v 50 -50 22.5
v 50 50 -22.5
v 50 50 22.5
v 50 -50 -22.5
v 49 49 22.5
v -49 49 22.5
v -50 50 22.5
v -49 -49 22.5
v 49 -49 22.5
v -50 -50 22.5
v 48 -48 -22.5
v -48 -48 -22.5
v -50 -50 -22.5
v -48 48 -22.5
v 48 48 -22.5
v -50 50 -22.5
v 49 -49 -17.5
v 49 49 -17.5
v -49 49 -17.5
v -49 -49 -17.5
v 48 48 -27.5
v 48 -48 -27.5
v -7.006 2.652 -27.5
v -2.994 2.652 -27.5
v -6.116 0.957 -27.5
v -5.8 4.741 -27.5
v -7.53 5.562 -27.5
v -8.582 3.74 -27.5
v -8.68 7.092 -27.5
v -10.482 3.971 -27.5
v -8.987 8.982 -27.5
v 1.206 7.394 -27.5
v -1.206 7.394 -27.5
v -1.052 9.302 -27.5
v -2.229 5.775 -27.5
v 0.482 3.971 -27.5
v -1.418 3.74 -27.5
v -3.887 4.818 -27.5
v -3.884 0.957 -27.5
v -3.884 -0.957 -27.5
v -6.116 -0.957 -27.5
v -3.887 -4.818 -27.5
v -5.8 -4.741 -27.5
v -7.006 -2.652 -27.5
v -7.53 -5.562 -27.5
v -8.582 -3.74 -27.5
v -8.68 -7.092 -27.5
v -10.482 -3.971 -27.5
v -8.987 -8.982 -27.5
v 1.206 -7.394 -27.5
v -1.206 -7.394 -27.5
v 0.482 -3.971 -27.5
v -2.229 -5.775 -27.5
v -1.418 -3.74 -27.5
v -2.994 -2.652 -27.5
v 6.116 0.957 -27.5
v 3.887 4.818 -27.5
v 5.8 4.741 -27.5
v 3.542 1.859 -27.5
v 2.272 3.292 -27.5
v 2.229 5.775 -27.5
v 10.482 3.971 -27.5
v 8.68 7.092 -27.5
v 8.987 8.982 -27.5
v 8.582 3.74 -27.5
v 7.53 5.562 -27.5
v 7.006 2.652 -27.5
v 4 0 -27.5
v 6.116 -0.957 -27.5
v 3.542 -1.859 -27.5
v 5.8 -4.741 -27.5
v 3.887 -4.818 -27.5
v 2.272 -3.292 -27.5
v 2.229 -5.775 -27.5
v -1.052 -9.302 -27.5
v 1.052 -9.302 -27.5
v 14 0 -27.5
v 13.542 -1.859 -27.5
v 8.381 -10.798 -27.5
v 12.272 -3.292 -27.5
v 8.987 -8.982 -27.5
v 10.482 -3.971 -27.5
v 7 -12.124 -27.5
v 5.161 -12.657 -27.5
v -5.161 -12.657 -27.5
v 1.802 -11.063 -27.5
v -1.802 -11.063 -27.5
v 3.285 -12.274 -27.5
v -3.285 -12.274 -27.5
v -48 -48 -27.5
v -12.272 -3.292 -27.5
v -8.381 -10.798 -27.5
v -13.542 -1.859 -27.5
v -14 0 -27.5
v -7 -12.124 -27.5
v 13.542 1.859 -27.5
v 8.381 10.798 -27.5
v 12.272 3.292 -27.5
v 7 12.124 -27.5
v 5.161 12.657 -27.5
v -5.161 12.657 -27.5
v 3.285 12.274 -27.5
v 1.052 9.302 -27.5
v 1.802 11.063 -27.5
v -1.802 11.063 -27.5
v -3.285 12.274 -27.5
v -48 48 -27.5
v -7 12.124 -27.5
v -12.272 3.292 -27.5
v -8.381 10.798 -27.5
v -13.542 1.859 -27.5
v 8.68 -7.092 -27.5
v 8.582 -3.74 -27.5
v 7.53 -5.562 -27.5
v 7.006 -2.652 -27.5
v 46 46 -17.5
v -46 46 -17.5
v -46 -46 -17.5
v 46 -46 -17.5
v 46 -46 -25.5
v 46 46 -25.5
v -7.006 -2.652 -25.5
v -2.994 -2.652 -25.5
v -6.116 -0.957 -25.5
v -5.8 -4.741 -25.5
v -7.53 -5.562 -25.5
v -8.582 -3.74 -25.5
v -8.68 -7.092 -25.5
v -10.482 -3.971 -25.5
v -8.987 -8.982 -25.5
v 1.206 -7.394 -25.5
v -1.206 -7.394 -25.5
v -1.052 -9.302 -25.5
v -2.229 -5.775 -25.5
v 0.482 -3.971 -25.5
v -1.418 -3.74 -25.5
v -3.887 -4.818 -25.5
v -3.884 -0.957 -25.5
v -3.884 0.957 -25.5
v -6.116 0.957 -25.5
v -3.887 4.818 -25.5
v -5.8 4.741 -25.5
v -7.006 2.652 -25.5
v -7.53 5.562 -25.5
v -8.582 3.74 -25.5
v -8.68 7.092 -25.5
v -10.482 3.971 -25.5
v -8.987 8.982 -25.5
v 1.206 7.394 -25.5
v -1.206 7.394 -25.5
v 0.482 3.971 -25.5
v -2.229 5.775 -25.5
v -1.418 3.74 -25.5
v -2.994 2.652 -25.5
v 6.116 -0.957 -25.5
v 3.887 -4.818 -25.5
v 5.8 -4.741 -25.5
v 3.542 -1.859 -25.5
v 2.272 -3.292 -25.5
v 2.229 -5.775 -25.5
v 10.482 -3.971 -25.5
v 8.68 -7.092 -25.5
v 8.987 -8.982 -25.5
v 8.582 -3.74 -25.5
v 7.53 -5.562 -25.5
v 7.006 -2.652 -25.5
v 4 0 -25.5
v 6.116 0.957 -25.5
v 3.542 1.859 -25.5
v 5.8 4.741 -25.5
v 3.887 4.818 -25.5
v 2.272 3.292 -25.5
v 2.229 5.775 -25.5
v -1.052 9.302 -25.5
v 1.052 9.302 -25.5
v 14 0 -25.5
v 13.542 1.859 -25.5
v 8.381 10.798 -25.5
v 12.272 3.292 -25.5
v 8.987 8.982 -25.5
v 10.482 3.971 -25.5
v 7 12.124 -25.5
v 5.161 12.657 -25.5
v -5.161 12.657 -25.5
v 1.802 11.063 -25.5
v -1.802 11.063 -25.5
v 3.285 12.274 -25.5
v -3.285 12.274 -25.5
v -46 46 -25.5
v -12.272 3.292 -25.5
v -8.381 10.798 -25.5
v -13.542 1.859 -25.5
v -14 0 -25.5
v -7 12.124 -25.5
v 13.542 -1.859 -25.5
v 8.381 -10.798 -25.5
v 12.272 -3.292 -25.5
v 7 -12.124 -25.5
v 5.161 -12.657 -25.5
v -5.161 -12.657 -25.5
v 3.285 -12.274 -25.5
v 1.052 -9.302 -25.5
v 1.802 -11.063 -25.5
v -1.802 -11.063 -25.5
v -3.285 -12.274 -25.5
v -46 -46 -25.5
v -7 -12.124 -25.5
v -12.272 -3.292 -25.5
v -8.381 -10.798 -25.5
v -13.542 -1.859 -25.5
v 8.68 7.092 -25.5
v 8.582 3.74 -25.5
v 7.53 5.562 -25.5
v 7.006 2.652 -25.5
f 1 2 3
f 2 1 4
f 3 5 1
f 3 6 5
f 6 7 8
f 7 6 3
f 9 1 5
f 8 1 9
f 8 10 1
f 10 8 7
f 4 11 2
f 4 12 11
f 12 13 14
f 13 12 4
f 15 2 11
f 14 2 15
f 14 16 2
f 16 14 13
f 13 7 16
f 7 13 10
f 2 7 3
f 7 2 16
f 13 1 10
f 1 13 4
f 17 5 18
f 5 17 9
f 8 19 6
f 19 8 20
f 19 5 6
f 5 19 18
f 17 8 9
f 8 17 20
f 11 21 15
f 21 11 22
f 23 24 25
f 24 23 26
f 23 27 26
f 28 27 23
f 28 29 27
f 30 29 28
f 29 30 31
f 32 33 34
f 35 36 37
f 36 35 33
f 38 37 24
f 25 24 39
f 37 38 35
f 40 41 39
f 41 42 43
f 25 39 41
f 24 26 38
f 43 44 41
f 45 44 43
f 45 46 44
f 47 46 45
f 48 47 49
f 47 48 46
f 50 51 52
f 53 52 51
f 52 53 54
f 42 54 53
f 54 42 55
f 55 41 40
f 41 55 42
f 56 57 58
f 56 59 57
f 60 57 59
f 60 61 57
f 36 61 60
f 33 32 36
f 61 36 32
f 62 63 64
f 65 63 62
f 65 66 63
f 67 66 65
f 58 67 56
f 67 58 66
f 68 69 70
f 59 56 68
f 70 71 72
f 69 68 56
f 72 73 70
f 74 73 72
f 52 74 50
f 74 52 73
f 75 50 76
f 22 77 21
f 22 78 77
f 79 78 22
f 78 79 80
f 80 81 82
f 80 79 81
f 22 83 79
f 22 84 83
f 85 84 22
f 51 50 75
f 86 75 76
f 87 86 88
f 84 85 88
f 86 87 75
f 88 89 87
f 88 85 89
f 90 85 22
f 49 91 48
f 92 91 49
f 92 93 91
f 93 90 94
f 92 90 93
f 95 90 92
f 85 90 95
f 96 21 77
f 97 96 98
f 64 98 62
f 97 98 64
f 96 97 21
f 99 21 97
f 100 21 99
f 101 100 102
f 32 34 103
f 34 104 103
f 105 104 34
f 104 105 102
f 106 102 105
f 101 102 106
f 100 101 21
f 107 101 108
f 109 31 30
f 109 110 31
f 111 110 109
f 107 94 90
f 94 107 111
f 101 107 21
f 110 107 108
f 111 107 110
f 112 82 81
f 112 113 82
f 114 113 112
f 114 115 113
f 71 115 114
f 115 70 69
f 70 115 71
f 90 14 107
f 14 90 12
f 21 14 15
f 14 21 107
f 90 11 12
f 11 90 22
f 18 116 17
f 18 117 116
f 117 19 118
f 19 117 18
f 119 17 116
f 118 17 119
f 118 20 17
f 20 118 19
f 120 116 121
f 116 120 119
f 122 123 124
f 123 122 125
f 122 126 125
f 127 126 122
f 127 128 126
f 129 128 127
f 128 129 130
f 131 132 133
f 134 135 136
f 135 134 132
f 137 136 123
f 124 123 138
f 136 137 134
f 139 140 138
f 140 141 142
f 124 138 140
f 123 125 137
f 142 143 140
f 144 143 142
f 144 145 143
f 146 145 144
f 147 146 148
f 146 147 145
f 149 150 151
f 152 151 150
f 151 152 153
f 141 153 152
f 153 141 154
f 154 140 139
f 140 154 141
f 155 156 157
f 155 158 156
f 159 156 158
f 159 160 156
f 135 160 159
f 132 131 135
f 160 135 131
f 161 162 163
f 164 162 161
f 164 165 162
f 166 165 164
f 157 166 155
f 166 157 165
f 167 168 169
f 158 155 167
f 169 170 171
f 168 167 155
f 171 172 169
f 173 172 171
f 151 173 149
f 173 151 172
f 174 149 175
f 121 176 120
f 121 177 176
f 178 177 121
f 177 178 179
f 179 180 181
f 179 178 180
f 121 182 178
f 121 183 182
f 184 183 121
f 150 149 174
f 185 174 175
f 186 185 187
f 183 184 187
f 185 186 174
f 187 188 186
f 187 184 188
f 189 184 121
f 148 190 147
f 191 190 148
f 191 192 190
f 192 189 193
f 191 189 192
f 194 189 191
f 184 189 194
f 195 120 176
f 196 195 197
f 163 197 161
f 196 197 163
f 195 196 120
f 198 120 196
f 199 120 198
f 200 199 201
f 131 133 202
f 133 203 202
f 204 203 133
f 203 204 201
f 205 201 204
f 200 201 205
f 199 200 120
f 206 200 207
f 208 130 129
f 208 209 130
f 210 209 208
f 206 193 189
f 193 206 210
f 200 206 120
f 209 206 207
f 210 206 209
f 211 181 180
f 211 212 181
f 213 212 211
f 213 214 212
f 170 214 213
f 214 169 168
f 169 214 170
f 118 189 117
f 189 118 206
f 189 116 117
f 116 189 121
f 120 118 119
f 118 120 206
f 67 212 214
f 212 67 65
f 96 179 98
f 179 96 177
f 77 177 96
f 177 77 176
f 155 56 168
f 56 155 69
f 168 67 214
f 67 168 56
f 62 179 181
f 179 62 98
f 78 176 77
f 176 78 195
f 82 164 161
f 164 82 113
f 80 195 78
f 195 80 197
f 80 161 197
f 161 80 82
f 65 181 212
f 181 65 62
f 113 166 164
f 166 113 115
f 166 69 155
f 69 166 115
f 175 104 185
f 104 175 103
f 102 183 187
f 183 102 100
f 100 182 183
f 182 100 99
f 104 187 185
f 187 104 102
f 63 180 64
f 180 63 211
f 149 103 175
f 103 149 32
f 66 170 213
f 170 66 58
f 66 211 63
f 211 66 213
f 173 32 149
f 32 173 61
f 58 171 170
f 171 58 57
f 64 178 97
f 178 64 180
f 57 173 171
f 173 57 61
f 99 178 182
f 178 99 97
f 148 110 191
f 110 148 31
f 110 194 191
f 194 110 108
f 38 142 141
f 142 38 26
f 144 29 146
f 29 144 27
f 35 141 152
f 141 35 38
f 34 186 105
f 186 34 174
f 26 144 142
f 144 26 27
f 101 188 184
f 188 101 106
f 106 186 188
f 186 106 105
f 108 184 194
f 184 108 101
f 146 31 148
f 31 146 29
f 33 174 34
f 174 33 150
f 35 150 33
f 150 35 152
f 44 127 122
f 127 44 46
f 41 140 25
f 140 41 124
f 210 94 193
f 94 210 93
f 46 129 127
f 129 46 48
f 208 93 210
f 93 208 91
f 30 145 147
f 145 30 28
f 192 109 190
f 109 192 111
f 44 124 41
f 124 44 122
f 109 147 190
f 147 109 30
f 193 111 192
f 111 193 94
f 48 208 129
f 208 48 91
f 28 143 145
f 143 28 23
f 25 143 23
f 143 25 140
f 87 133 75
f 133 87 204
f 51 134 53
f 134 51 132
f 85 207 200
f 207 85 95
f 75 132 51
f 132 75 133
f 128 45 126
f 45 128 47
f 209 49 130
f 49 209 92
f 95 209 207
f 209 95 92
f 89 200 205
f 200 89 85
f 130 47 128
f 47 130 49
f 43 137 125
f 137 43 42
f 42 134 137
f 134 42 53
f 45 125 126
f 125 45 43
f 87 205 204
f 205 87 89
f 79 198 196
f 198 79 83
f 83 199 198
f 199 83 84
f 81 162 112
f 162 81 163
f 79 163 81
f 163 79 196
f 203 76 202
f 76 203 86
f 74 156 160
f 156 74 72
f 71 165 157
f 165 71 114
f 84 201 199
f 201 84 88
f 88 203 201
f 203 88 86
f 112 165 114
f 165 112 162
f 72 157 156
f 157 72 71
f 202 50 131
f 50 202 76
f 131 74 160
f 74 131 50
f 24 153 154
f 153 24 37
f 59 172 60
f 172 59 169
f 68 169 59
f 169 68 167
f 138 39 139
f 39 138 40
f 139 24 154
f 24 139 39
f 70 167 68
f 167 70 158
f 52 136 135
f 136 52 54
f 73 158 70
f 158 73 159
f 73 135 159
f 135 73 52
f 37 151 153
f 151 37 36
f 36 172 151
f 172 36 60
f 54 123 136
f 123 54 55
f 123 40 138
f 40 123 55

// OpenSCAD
// file: parameters.scad
$width = 100;
$depth = 100;
$height = 50;

$margin = 2;

$connection = 5;

$hole_dia = 4;
// main file
include <parameters.scad>

module planter() {
  union() {
    difference() {
      difference() {
        union() {
          // Top part of planter
          color("lime") difference() {
            cube(size = [ $width, $depth, $height - $connection ],
                 center = true);

            // DIFF
            translate([ 0, 0, $margin ]) cube(
                size =
                    [ $width - $margin, $depth - $margin, $height + $margin ],
                center = true);
          }

          // Bottom connector
          color("tomato") translate([ 0, 0, -($height / 2) ]) {
            union() {
              // Connector part
              cube(size =
                       [
                         $width - $margin * 2, $depth - $margin * 2,
                         $connection
                       ],
                   center = true);

              // Connecting bit to outer shell
              translate([ 0, 0, $connection ])
                  cube(size = [ $width - .1, $depth - .1, $connection ],
                       center = true);
            }
          }
        }
        // DIFF
        translate([ 0, 0, -$height / 2 + $margin * 2 ])
            cube(size =
                     [
                       $width - $margin * 4, $depth - $margin * 4,
                       $connection + $margin * 2
                     ],
                 center = true);
      }

      // Drainage holes
      translate([ 0, 0, -$height ]) cylinder($height, $hole_dia, $hole_dia);
      for (i = [0:5]) {
        rotate([ 0, 0, 360 / 6 * i ])
            translate([ $hole_dia * 2 + $margin, 0, -$height ])
                cylinder($height, $hole_dia, $hole_dia);
      }
    }

    // color("violet") translate([ 0, 0, -$height / 2 - $margin * 1.25 ]) {
    //   difference() {
    //     cylinder($height, $hole_dia, $hole_dia);
    //     translate([ 0, 0, -$margin ])
    //         cylinder($height + $margin * 2, $hole_dia - $margin * 0.5,
    //                  $hole_dia - $margin * 0.5);
    //   }
    // }
  }
}
planter();
